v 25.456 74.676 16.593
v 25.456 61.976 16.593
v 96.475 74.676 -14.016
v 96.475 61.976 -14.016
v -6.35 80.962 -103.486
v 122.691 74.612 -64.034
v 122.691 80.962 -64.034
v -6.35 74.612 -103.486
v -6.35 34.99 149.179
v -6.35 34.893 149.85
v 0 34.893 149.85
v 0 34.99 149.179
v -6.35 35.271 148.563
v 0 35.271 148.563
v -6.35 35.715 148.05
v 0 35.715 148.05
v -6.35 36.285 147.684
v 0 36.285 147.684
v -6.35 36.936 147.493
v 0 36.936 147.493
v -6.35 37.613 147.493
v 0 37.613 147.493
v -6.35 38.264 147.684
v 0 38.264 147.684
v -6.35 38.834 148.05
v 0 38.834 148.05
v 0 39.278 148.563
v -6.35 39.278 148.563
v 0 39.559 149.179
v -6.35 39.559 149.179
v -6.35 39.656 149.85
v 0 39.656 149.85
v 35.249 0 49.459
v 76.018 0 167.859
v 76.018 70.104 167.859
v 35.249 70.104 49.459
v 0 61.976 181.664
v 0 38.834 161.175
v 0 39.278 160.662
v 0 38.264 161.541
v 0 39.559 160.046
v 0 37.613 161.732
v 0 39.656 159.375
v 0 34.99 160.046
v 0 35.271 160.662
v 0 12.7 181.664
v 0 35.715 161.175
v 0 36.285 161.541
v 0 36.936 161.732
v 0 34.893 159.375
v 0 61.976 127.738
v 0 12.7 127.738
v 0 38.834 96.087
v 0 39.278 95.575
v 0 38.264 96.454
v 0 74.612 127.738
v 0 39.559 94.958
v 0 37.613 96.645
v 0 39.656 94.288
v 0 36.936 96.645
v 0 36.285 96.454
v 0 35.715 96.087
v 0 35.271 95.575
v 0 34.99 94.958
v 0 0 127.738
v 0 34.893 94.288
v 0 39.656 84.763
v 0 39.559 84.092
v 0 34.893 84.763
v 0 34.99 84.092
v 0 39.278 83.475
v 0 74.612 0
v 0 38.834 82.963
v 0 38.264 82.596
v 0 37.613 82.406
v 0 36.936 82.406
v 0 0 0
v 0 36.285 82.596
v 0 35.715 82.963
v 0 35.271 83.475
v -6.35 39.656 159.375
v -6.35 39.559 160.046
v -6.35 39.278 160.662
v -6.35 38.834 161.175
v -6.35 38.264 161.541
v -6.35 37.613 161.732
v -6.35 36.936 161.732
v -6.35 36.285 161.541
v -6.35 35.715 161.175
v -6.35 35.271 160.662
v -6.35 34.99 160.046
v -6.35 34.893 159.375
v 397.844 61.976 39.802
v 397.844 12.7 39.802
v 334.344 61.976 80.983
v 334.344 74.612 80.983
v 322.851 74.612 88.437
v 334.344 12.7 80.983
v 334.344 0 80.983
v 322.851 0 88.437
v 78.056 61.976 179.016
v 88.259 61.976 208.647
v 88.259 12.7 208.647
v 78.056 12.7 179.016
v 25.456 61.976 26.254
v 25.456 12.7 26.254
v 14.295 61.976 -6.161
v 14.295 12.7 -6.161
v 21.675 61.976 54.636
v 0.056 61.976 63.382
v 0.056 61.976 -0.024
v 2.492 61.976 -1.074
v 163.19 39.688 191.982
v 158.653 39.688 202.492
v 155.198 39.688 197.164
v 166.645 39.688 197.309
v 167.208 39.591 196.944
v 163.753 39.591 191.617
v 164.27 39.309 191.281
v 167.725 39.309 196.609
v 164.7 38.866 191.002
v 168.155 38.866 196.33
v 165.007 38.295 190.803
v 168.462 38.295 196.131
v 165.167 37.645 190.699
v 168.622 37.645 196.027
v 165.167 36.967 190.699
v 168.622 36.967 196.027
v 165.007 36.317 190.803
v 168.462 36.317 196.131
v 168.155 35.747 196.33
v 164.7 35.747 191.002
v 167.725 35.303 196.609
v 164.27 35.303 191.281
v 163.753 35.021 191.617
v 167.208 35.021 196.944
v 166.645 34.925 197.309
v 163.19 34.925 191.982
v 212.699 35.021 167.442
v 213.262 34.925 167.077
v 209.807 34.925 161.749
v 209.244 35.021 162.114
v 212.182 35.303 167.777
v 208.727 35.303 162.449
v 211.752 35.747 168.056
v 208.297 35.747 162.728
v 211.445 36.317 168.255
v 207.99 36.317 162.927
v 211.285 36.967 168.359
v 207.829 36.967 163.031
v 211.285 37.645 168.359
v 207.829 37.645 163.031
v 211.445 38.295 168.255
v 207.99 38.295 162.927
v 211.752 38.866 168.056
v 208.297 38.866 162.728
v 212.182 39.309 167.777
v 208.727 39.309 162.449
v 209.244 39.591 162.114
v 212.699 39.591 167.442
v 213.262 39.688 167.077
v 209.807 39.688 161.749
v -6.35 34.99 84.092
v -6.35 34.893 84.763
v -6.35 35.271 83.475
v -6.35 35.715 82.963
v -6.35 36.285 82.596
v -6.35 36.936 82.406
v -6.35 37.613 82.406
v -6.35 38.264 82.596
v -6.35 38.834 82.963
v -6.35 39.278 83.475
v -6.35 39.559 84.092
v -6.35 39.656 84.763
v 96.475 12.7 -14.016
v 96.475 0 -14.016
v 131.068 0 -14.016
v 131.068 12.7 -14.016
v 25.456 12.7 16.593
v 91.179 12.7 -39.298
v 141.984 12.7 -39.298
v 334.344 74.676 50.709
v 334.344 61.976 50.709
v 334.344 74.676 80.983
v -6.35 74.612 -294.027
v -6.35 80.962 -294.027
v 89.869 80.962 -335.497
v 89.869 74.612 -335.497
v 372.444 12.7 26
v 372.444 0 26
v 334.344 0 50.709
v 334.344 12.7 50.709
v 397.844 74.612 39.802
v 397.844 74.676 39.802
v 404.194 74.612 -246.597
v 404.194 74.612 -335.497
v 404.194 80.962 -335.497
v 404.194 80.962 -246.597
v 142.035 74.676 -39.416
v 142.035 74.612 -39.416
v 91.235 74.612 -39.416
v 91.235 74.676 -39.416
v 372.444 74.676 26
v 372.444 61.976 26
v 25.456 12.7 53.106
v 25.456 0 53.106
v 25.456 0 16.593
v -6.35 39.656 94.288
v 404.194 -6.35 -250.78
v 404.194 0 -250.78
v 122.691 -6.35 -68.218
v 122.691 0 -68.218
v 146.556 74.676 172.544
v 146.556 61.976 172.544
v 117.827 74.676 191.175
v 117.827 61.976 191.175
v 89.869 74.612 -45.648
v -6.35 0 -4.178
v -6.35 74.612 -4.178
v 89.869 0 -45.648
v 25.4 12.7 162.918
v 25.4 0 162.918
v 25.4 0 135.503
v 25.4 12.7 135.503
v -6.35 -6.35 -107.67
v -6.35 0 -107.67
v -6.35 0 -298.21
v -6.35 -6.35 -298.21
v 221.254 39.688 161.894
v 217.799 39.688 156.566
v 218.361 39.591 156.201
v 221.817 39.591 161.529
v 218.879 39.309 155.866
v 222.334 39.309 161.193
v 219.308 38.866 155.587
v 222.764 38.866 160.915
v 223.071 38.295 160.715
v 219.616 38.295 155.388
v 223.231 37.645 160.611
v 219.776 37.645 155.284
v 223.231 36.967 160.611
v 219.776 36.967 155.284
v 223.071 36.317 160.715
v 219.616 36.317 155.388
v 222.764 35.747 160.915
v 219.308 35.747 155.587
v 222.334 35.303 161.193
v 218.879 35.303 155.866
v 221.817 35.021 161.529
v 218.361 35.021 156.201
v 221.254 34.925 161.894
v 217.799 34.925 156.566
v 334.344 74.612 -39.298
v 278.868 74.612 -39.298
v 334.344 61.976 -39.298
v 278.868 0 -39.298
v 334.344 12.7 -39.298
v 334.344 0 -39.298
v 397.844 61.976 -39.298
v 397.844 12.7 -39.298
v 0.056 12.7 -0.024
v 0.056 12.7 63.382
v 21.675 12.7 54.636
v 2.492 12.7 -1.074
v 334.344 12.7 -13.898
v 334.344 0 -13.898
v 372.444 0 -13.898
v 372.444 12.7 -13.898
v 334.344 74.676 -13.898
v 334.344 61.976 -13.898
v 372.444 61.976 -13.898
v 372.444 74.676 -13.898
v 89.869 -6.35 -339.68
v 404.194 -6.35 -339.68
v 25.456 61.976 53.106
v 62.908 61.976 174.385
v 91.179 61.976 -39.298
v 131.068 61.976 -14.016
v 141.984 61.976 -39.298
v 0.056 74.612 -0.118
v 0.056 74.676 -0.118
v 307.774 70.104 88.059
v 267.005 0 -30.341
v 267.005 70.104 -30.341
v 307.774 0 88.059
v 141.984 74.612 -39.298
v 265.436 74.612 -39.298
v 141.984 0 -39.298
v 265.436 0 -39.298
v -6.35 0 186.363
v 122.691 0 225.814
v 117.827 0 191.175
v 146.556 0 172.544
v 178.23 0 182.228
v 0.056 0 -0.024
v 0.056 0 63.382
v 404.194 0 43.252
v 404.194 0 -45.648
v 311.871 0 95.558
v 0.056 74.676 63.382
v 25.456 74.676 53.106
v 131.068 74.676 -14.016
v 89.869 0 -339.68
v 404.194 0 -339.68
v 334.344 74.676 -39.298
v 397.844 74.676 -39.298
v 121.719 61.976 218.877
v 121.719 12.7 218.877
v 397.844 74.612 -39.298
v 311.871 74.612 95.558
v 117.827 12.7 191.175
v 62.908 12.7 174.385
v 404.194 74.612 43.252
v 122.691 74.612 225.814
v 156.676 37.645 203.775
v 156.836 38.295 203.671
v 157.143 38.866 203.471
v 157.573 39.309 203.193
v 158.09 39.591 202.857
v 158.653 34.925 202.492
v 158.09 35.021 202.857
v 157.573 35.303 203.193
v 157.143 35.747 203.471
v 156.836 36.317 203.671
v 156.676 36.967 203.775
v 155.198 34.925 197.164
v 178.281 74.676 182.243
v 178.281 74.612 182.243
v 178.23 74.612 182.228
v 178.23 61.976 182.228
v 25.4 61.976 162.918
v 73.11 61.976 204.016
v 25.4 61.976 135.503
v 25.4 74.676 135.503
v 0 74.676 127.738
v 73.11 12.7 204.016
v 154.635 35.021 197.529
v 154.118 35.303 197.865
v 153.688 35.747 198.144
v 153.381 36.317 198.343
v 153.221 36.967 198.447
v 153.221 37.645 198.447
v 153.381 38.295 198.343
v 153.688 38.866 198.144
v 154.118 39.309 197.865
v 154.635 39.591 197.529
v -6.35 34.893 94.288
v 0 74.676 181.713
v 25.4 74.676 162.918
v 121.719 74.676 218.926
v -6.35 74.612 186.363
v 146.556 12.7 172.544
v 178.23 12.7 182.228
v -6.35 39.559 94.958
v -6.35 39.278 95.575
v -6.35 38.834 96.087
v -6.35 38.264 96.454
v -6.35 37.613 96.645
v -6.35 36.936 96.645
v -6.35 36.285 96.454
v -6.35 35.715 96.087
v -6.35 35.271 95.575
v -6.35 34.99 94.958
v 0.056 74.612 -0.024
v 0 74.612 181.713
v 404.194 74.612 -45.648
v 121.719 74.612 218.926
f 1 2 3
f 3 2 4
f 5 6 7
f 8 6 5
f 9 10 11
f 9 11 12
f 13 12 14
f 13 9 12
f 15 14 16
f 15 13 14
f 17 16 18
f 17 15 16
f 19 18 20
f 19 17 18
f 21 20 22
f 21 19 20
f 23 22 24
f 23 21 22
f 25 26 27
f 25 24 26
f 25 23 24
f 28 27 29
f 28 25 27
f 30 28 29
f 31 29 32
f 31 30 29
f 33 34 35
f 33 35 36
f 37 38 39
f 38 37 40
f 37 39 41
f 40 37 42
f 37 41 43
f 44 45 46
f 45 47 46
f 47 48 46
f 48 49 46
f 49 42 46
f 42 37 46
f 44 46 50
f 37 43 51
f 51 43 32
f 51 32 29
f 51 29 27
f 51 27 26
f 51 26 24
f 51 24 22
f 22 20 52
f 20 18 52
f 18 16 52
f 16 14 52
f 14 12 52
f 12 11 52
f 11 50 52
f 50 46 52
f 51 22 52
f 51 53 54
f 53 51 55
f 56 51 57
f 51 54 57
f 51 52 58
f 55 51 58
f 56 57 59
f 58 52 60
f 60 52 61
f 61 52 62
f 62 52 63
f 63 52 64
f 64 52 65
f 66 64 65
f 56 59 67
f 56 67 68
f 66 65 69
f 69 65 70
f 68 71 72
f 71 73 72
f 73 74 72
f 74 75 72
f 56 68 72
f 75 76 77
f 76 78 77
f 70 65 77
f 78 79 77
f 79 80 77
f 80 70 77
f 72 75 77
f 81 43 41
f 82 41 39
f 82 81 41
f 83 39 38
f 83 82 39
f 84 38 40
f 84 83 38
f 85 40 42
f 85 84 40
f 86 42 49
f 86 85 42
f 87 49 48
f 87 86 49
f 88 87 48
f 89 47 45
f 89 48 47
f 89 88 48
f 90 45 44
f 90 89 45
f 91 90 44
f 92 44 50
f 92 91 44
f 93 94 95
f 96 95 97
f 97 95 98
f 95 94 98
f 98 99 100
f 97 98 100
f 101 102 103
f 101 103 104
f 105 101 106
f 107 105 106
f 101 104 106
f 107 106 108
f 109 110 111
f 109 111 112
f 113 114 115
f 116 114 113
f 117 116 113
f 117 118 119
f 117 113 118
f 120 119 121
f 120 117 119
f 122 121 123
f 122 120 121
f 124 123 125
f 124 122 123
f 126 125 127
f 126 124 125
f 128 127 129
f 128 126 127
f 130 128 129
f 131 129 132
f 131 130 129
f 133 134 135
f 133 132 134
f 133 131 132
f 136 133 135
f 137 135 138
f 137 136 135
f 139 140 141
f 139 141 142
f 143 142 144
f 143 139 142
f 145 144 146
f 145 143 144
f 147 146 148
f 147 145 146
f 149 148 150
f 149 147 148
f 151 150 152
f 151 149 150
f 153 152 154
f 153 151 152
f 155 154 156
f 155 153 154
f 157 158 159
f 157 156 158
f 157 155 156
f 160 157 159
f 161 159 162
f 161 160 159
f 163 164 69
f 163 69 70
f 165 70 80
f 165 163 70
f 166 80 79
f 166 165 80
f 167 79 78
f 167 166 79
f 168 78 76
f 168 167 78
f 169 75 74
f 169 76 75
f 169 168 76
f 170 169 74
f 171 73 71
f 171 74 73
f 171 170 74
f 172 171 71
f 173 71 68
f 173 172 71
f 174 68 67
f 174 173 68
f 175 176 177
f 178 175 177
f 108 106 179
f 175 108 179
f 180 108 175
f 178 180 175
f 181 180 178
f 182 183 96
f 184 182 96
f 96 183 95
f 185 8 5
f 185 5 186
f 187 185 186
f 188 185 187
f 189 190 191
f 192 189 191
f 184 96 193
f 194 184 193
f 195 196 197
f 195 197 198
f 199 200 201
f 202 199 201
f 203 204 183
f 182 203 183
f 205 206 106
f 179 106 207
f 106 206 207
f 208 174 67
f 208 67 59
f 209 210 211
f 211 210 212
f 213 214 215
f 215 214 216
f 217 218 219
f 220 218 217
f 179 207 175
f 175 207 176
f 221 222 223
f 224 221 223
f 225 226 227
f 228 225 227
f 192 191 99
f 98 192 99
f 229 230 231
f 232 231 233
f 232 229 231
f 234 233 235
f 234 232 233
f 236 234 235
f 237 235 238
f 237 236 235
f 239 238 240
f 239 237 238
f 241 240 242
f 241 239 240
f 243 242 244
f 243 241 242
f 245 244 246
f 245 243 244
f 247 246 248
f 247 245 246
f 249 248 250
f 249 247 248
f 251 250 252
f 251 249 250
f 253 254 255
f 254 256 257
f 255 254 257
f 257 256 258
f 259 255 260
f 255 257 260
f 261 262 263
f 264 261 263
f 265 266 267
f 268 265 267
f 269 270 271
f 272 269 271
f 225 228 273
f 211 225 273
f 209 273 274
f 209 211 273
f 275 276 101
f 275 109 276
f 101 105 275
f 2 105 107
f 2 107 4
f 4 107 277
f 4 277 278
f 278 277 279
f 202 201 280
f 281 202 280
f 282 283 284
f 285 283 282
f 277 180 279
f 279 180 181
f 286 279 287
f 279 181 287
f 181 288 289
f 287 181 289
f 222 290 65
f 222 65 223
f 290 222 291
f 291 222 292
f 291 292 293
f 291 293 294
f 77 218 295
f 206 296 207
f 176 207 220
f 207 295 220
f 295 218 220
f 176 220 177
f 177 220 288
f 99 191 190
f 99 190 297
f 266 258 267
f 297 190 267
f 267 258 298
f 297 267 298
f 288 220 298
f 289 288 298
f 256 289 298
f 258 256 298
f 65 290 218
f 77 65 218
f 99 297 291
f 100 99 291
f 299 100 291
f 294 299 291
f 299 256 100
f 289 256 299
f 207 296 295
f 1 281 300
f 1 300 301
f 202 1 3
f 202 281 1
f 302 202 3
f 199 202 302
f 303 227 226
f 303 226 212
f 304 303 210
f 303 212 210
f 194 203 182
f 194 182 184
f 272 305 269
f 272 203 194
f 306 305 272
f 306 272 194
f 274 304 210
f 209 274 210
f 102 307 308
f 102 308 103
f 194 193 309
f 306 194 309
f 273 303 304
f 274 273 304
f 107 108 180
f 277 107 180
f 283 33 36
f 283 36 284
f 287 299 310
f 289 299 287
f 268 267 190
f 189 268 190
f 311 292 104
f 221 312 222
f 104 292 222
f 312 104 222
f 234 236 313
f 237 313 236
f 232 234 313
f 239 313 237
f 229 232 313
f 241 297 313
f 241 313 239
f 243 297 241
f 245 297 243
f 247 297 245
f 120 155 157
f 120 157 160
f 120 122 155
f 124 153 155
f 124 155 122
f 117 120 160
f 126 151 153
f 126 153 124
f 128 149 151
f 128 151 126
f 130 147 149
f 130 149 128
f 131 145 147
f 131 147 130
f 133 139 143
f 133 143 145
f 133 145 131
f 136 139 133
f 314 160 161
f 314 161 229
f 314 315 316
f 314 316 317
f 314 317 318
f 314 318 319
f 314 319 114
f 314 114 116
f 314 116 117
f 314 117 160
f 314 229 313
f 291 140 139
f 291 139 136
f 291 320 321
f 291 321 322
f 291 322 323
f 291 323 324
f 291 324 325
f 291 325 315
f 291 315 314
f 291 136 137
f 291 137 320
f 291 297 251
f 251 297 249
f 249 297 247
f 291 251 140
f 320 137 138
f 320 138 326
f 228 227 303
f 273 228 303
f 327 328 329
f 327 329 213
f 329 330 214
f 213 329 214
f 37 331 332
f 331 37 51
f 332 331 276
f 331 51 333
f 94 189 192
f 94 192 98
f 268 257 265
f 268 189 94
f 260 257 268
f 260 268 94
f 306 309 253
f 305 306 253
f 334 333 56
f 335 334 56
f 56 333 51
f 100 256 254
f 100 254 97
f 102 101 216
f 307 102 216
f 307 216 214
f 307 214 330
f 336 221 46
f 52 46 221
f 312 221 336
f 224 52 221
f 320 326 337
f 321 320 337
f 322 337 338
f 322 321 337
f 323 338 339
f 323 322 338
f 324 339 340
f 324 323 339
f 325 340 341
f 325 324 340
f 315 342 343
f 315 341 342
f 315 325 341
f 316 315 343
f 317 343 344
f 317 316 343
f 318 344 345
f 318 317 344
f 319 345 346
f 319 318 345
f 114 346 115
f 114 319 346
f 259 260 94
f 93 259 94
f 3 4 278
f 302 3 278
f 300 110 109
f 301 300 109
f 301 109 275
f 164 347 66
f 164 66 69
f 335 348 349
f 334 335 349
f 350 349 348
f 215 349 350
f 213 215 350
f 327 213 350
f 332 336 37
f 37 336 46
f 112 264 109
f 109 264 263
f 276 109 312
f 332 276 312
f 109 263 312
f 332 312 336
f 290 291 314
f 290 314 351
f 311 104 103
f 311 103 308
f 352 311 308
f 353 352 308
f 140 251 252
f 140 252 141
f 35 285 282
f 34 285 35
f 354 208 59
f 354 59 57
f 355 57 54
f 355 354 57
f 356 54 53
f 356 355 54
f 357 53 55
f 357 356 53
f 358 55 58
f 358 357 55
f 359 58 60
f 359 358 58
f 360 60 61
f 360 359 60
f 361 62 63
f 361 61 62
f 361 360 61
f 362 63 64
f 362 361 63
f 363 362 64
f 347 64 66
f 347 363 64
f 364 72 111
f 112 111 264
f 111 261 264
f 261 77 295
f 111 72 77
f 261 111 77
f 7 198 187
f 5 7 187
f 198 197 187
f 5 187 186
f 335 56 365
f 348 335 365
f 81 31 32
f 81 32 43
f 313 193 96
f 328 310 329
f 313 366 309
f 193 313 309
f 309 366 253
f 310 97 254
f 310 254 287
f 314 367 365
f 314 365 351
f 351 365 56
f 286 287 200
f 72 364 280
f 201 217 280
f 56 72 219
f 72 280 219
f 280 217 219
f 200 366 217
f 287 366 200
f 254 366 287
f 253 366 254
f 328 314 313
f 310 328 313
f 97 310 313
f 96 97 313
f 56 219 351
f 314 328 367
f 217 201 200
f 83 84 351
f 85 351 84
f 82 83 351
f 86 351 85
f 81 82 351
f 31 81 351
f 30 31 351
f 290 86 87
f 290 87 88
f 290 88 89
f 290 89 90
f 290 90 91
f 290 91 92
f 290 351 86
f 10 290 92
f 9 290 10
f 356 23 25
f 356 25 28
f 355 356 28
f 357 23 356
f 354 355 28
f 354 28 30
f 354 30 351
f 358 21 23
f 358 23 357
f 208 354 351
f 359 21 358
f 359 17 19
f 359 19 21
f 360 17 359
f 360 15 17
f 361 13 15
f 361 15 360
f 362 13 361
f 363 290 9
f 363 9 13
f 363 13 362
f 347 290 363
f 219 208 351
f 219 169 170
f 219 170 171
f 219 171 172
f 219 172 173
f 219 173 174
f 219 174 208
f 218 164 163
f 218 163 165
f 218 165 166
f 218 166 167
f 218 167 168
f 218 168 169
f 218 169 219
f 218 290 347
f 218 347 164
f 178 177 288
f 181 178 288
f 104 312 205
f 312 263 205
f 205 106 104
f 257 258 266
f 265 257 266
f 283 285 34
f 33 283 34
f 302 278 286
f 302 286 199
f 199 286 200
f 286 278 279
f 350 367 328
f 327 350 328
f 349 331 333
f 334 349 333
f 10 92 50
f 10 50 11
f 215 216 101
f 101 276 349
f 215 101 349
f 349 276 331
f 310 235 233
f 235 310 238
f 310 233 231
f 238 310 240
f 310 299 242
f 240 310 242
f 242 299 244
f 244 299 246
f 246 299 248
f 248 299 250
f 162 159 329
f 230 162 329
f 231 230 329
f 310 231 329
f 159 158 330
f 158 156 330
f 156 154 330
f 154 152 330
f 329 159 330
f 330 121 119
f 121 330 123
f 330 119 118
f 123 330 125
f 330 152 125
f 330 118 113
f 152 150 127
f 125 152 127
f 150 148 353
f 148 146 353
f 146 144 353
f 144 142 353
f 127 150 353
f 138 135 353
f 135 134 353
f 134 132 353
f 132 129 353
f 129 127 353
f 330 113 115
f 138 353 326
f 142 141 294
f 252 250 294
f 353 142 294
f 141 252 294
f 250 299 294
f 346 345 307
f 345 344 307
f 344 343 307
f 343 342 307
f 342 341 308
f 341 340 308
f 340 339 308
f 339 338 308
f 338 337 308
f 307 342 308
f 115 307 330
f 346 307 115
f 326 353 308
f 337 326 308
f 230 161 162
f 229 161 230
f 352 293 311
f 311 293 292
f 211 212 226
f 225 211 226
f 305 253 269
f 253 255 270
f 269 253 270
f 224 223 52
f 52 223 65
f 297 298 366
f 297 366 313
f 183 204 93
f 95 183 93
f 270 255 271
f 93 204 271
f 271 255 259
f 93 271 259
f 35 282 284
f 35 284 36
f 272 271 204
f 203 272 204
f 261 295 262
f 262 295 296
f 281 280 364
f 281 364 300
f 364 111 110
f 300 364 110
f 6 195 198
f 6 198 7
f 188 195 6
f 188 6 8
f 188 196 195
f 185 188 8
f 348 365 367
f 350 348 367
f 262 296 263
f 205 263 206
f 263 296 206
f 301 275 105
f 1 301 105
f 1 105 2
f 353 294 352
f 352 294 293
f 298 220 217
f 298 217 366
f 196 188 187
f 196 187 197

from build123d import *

# Parameters (mm, degrees)
BOSS_EXTRUDE1_DEPTH = 74.6125
BOSS_EXTRUDE2_DEPTH = 70.104
BOSS_EXTRUDE3_DEPTH = 12.7
BOSS_EXTRUDE4_DEPTH = 12.7
BOSS_EXTRUDE5_DEPTH = 12.7
LPATTERN2_COUNT     = 2
LPATTERN2_PITCH     = 61.976
LPATTERN3_COUNT     = 2
LPATTERN3_PITCH     = 61.976
LPATTERN4_COUNT     = 2
LPATTERN4_PITCH     = 61.976
CUT_EXTRUDE1_DEPTH  = 6.604
CUT_EXTRUDE2_DEPTH  = 6.604
BOSS_EXTRUDE6_DEPTH = 74.6125
BOSS_EXTRUDE7_DEPTH = 49.276
BOSS_EXTRUDE8_DEPTH = 6.35
BOSS_EXTRUDE9_DEPTH = 6.35


with BuildPart() as part:
    # Sketch1 → Boss-Extrude1 (new body)
    with BuildSketch(Plane(origin=(0, 0, 0), x_dir=(1, 0, 0), z_dir=(0, 1, 0))):
        Polygon((89.868600995, 45.648080015), (404.193600995, 45.648080015), (404.193600995, -43.251919985), (122.691373008, -225.814419985), (-6.35, -186.362513079), (-6.35, 4.177832277), align=None)
        Polygon((0, 0), (91.178772423, 39.298080015), (397.843600995, 39.298080015), (397.843600995, -39.801610813), (121.718547276, -218.876854657), (0, -181.663760252), align=None, mode=Mode.SUBTRACT)
    extrude(amount=BOSS_EXTRUDE1_DEPTH)

    # Sketch6 → Boss-Extrude3 (add)
    with BuildSketch(Plane(origin=(-0.579421474, 0, -0.117869918), x_dir=(1, 0, 0), z_dir=(0, 1, 0))):
        Polygon((91.814060346, 39.298080015), (0.635287923, 0), (0.635287923, -63.5), (26.035287923, -53.223829107), (26.035287923, -16.711329107), (97.054746056, 13.898080015), (131.646926177, 13.898080015), (142.614060346, 39.298080015), align=None)
    boss_extrude3 = extrude(amount=BOSS_EXTRUDE3_DEPTH)

    # Sketch8 → Boss-Extrude4 (add)
    with BuildSketch(Plane(origin=(0, 0, -81.231233885), x_dir=(1, 0, 0), z_dir=(0, 1, 0))):
        Polygon((0, -262.943760252), (121.718547276, -300.156854657), (178.280689217, -263.474636858), (146.55570838, -253.775336847), (117.827244348, -272.406593346), (25.4, -244.148748947), (25.4, -216.734319561), (0, -208.968760252), align=None)
    boss_extrude4 = extrude(amount=BOSS_EXTRUDE4_DEPTH)

    # Sketch9 → Boss-Extrude5 (add)
    with BuildSketch(Plane(origin=(0, 0, 0), x_dir=(1, 0, 0), z_dir=(0, 1, 0))):
        Polygon((397.843600995, 39.298080015), (334.343600995, 39.298080015), (334.343600995, 13.898080015), (372.443600995, 13.898080015), (372.443600995, -26.000374123), (334.343600995, -50.709348186), (334.343600995, -80.983234251), (397.843600995, -39.801610813), align=None)
    boss_extrude5 = extrude(amount=BOSS_EXTRUDE5_DEPTH)

    # LPattern2: Boss-Extrude3 ×2
    with Locations(*[(0, i * LPATTERN2_PITCH, 0) for i in range(1, LPATTERN2_COUNT)]):
        add(boss_extrude3)

    # LPattern3: Boss-Extrude4 ×2
    with Locations(*[(0, i * LPATTERN3_PITCH, 0) for i in range(1, LPATTERN3_COUNT)]):
        add(boss_extrude4)

    # LPattern4: Boss-Extrude5 ×2
    with Locations(*[(0, i * LPATTERN4_PITCH, 0) for i in range(1, LPATTERN4_COUNT)]):
        add(boss_extrude5)

    # Sketch12 → Cut-Extrude1 (cut)
    with BuildSketch(Plane(origin=(139.41395441, 0, 214.96933258), x_dir=(0.8390069231931274, 0, -0.5441207428815794), z_dir=(0.5441207428815794, 0, 0.8390069231931274))):
        with BuildLine():
            Line((22.931101414, 39.6875), (32.456101414, 39.6875))
            ThreePointArc((32.456101414, 39.6875), (34.837351414, 37.30625), (32.456101414, 34.925))
            Line((32.456101414, 34.925), (22.931101414, 34.925))
            ThreePointArc((22.931101414, 34.925), (20.549851414, 37.30625), (22.931101414, 39.6875))
        make_face()
        with BuildLine():
            Line((88.018601414, 39.6875), (97.543601414, 39.6875))
            ThreePointArc((97.543601414, 39.6875), (99.924851414, 37.30625), (97.543601414, 34.925))
            Line((97.543601414, 34.925), (88.018601414, 34.925))
            ThreePointArc((88.018601414, 34.925), (85.637351414, 37.30625), (88.018601414, 39.6875))
        make_face()
    extrude(amount=-CUT_EXTRUDE1_DEPTH, mode=Mode.SUBTRACT)

    # Sketch14 → Cut-Extrude2 (cut)
    with BuildSketch(Plane.ZY.offset(6.35)):
        with BuildLine():
            Line((149.850013079, 39.65575), (159.375013079, 39.65575))
            ThreePointArc((159.375013079, 39.65575), (161.756263079, 37.2745), (159.375013079, 34.89325))
            Line((159.375013079, 34.89325), (149.850013079, 34.89325))
            ThreePointArc((149.850013079, 34.89325), (147.468763079, 37.2745), (149.850013079, 39.65575))
        make_face()
        with BuildLine():
            Line((84.762513079, 39.65575), (94.287513079, 39.65575))
            ThreePointArc((94.287513079, 39.65575), (96.668763079, 37.2745), (94.287513079, 34.89325))
            Line((94.287513079, 34.89325), (84.762513079, 34.89325))
            ThreePointArc((84.762513079, 34.89325), (82.381263079, 37.2745), (84.762513079, 39.65575))
        make_face()
    extrude(amount=-CUT_EXTRUDE2_DEPTH, mode=Mode.SUBTRACT)

    # Sketch15 → Boss-Extrude6 (add)
    with BuildSketch(Plane(origin=(0, 0, 0), x_dir=(1, 0, 0), z_dir=(0, 1, 0))):
        Polygon((311.870652445, -95.557604404), (265.43611649, 39.298080015), (278.867899141, 39.298080015), (322.850551087, -88.436816195), align=None)
    extrude(amount=BOSS_EXTRUDE6_DEPTH)

    # Sketch17 → Boss-Extrude7 (add)
    with BuildSketch(Plane(origin=(0, 12.7, 0), x_dir=(1, 0, 0), z_dir=(0, 1, 0))):
        Polygon((88.258946348, -208.647228064), (14.294556224, 6.160958295), (2.492263114, 1.074166197), (73.11042215, -204.015859438), align=None)
    extrude(amount=BOSS_EXTRUDE7_DEPTH)


with BuildPart() as body_2:
    # Sketch2 → Boss-Extrude2 (new body)
    with BuildSketch(Plane(origin=(52.712309054, 0, 182.271693664), x_dir=(1, 0, 0), z_dir=(0, 1, 0))):
        Polygon((-17.462985573, 132.812645381), (214.293072493, 212.61265572), (255.06136793, 94.212928646), (23.305309865, 14.412918307), align=None)
    extrude(amount=BOSS_EXTRUDE2_DEPTH)


with BuildPart() as body_3:
    # Sketch18 → Boss-Extrude8 (new body)
    with BuildSketch(Plane(origin=(0, 74.6125, 0), x_dir=(1, 0, 0), z_dir=(0, 1, 0))):
        Polygon((404.193600995, 246.596861523), (122.691373008, 64.034361523), (-6.35, 103.486268429), (-6.35, 294.026613784), (89.868600995, 335.496861523), (404.193600995, 335.496861523), align=None)
    extrude(amount=BOSS_EXTRUDE8_DEPTH)


with BuildPart() as body_4:
    # Sketch19 → Boss-Extrude9 (new body)
    with BuildSketch(Plane.XZ):
        Polygon((122.691373008, -68.217878295), (-6.35, -107.669785201), (-6.35, -298.210130556), (89.868600995, -339.680378295), (404.193600995, -339.680378295), (404.193600995, -250.780378295), align=None)
    extrude(amount=BOSS_EXTRUDE9_DEPTH)


solid = Compound([part.part, body_2.part, body_3.part, body_4.part])
